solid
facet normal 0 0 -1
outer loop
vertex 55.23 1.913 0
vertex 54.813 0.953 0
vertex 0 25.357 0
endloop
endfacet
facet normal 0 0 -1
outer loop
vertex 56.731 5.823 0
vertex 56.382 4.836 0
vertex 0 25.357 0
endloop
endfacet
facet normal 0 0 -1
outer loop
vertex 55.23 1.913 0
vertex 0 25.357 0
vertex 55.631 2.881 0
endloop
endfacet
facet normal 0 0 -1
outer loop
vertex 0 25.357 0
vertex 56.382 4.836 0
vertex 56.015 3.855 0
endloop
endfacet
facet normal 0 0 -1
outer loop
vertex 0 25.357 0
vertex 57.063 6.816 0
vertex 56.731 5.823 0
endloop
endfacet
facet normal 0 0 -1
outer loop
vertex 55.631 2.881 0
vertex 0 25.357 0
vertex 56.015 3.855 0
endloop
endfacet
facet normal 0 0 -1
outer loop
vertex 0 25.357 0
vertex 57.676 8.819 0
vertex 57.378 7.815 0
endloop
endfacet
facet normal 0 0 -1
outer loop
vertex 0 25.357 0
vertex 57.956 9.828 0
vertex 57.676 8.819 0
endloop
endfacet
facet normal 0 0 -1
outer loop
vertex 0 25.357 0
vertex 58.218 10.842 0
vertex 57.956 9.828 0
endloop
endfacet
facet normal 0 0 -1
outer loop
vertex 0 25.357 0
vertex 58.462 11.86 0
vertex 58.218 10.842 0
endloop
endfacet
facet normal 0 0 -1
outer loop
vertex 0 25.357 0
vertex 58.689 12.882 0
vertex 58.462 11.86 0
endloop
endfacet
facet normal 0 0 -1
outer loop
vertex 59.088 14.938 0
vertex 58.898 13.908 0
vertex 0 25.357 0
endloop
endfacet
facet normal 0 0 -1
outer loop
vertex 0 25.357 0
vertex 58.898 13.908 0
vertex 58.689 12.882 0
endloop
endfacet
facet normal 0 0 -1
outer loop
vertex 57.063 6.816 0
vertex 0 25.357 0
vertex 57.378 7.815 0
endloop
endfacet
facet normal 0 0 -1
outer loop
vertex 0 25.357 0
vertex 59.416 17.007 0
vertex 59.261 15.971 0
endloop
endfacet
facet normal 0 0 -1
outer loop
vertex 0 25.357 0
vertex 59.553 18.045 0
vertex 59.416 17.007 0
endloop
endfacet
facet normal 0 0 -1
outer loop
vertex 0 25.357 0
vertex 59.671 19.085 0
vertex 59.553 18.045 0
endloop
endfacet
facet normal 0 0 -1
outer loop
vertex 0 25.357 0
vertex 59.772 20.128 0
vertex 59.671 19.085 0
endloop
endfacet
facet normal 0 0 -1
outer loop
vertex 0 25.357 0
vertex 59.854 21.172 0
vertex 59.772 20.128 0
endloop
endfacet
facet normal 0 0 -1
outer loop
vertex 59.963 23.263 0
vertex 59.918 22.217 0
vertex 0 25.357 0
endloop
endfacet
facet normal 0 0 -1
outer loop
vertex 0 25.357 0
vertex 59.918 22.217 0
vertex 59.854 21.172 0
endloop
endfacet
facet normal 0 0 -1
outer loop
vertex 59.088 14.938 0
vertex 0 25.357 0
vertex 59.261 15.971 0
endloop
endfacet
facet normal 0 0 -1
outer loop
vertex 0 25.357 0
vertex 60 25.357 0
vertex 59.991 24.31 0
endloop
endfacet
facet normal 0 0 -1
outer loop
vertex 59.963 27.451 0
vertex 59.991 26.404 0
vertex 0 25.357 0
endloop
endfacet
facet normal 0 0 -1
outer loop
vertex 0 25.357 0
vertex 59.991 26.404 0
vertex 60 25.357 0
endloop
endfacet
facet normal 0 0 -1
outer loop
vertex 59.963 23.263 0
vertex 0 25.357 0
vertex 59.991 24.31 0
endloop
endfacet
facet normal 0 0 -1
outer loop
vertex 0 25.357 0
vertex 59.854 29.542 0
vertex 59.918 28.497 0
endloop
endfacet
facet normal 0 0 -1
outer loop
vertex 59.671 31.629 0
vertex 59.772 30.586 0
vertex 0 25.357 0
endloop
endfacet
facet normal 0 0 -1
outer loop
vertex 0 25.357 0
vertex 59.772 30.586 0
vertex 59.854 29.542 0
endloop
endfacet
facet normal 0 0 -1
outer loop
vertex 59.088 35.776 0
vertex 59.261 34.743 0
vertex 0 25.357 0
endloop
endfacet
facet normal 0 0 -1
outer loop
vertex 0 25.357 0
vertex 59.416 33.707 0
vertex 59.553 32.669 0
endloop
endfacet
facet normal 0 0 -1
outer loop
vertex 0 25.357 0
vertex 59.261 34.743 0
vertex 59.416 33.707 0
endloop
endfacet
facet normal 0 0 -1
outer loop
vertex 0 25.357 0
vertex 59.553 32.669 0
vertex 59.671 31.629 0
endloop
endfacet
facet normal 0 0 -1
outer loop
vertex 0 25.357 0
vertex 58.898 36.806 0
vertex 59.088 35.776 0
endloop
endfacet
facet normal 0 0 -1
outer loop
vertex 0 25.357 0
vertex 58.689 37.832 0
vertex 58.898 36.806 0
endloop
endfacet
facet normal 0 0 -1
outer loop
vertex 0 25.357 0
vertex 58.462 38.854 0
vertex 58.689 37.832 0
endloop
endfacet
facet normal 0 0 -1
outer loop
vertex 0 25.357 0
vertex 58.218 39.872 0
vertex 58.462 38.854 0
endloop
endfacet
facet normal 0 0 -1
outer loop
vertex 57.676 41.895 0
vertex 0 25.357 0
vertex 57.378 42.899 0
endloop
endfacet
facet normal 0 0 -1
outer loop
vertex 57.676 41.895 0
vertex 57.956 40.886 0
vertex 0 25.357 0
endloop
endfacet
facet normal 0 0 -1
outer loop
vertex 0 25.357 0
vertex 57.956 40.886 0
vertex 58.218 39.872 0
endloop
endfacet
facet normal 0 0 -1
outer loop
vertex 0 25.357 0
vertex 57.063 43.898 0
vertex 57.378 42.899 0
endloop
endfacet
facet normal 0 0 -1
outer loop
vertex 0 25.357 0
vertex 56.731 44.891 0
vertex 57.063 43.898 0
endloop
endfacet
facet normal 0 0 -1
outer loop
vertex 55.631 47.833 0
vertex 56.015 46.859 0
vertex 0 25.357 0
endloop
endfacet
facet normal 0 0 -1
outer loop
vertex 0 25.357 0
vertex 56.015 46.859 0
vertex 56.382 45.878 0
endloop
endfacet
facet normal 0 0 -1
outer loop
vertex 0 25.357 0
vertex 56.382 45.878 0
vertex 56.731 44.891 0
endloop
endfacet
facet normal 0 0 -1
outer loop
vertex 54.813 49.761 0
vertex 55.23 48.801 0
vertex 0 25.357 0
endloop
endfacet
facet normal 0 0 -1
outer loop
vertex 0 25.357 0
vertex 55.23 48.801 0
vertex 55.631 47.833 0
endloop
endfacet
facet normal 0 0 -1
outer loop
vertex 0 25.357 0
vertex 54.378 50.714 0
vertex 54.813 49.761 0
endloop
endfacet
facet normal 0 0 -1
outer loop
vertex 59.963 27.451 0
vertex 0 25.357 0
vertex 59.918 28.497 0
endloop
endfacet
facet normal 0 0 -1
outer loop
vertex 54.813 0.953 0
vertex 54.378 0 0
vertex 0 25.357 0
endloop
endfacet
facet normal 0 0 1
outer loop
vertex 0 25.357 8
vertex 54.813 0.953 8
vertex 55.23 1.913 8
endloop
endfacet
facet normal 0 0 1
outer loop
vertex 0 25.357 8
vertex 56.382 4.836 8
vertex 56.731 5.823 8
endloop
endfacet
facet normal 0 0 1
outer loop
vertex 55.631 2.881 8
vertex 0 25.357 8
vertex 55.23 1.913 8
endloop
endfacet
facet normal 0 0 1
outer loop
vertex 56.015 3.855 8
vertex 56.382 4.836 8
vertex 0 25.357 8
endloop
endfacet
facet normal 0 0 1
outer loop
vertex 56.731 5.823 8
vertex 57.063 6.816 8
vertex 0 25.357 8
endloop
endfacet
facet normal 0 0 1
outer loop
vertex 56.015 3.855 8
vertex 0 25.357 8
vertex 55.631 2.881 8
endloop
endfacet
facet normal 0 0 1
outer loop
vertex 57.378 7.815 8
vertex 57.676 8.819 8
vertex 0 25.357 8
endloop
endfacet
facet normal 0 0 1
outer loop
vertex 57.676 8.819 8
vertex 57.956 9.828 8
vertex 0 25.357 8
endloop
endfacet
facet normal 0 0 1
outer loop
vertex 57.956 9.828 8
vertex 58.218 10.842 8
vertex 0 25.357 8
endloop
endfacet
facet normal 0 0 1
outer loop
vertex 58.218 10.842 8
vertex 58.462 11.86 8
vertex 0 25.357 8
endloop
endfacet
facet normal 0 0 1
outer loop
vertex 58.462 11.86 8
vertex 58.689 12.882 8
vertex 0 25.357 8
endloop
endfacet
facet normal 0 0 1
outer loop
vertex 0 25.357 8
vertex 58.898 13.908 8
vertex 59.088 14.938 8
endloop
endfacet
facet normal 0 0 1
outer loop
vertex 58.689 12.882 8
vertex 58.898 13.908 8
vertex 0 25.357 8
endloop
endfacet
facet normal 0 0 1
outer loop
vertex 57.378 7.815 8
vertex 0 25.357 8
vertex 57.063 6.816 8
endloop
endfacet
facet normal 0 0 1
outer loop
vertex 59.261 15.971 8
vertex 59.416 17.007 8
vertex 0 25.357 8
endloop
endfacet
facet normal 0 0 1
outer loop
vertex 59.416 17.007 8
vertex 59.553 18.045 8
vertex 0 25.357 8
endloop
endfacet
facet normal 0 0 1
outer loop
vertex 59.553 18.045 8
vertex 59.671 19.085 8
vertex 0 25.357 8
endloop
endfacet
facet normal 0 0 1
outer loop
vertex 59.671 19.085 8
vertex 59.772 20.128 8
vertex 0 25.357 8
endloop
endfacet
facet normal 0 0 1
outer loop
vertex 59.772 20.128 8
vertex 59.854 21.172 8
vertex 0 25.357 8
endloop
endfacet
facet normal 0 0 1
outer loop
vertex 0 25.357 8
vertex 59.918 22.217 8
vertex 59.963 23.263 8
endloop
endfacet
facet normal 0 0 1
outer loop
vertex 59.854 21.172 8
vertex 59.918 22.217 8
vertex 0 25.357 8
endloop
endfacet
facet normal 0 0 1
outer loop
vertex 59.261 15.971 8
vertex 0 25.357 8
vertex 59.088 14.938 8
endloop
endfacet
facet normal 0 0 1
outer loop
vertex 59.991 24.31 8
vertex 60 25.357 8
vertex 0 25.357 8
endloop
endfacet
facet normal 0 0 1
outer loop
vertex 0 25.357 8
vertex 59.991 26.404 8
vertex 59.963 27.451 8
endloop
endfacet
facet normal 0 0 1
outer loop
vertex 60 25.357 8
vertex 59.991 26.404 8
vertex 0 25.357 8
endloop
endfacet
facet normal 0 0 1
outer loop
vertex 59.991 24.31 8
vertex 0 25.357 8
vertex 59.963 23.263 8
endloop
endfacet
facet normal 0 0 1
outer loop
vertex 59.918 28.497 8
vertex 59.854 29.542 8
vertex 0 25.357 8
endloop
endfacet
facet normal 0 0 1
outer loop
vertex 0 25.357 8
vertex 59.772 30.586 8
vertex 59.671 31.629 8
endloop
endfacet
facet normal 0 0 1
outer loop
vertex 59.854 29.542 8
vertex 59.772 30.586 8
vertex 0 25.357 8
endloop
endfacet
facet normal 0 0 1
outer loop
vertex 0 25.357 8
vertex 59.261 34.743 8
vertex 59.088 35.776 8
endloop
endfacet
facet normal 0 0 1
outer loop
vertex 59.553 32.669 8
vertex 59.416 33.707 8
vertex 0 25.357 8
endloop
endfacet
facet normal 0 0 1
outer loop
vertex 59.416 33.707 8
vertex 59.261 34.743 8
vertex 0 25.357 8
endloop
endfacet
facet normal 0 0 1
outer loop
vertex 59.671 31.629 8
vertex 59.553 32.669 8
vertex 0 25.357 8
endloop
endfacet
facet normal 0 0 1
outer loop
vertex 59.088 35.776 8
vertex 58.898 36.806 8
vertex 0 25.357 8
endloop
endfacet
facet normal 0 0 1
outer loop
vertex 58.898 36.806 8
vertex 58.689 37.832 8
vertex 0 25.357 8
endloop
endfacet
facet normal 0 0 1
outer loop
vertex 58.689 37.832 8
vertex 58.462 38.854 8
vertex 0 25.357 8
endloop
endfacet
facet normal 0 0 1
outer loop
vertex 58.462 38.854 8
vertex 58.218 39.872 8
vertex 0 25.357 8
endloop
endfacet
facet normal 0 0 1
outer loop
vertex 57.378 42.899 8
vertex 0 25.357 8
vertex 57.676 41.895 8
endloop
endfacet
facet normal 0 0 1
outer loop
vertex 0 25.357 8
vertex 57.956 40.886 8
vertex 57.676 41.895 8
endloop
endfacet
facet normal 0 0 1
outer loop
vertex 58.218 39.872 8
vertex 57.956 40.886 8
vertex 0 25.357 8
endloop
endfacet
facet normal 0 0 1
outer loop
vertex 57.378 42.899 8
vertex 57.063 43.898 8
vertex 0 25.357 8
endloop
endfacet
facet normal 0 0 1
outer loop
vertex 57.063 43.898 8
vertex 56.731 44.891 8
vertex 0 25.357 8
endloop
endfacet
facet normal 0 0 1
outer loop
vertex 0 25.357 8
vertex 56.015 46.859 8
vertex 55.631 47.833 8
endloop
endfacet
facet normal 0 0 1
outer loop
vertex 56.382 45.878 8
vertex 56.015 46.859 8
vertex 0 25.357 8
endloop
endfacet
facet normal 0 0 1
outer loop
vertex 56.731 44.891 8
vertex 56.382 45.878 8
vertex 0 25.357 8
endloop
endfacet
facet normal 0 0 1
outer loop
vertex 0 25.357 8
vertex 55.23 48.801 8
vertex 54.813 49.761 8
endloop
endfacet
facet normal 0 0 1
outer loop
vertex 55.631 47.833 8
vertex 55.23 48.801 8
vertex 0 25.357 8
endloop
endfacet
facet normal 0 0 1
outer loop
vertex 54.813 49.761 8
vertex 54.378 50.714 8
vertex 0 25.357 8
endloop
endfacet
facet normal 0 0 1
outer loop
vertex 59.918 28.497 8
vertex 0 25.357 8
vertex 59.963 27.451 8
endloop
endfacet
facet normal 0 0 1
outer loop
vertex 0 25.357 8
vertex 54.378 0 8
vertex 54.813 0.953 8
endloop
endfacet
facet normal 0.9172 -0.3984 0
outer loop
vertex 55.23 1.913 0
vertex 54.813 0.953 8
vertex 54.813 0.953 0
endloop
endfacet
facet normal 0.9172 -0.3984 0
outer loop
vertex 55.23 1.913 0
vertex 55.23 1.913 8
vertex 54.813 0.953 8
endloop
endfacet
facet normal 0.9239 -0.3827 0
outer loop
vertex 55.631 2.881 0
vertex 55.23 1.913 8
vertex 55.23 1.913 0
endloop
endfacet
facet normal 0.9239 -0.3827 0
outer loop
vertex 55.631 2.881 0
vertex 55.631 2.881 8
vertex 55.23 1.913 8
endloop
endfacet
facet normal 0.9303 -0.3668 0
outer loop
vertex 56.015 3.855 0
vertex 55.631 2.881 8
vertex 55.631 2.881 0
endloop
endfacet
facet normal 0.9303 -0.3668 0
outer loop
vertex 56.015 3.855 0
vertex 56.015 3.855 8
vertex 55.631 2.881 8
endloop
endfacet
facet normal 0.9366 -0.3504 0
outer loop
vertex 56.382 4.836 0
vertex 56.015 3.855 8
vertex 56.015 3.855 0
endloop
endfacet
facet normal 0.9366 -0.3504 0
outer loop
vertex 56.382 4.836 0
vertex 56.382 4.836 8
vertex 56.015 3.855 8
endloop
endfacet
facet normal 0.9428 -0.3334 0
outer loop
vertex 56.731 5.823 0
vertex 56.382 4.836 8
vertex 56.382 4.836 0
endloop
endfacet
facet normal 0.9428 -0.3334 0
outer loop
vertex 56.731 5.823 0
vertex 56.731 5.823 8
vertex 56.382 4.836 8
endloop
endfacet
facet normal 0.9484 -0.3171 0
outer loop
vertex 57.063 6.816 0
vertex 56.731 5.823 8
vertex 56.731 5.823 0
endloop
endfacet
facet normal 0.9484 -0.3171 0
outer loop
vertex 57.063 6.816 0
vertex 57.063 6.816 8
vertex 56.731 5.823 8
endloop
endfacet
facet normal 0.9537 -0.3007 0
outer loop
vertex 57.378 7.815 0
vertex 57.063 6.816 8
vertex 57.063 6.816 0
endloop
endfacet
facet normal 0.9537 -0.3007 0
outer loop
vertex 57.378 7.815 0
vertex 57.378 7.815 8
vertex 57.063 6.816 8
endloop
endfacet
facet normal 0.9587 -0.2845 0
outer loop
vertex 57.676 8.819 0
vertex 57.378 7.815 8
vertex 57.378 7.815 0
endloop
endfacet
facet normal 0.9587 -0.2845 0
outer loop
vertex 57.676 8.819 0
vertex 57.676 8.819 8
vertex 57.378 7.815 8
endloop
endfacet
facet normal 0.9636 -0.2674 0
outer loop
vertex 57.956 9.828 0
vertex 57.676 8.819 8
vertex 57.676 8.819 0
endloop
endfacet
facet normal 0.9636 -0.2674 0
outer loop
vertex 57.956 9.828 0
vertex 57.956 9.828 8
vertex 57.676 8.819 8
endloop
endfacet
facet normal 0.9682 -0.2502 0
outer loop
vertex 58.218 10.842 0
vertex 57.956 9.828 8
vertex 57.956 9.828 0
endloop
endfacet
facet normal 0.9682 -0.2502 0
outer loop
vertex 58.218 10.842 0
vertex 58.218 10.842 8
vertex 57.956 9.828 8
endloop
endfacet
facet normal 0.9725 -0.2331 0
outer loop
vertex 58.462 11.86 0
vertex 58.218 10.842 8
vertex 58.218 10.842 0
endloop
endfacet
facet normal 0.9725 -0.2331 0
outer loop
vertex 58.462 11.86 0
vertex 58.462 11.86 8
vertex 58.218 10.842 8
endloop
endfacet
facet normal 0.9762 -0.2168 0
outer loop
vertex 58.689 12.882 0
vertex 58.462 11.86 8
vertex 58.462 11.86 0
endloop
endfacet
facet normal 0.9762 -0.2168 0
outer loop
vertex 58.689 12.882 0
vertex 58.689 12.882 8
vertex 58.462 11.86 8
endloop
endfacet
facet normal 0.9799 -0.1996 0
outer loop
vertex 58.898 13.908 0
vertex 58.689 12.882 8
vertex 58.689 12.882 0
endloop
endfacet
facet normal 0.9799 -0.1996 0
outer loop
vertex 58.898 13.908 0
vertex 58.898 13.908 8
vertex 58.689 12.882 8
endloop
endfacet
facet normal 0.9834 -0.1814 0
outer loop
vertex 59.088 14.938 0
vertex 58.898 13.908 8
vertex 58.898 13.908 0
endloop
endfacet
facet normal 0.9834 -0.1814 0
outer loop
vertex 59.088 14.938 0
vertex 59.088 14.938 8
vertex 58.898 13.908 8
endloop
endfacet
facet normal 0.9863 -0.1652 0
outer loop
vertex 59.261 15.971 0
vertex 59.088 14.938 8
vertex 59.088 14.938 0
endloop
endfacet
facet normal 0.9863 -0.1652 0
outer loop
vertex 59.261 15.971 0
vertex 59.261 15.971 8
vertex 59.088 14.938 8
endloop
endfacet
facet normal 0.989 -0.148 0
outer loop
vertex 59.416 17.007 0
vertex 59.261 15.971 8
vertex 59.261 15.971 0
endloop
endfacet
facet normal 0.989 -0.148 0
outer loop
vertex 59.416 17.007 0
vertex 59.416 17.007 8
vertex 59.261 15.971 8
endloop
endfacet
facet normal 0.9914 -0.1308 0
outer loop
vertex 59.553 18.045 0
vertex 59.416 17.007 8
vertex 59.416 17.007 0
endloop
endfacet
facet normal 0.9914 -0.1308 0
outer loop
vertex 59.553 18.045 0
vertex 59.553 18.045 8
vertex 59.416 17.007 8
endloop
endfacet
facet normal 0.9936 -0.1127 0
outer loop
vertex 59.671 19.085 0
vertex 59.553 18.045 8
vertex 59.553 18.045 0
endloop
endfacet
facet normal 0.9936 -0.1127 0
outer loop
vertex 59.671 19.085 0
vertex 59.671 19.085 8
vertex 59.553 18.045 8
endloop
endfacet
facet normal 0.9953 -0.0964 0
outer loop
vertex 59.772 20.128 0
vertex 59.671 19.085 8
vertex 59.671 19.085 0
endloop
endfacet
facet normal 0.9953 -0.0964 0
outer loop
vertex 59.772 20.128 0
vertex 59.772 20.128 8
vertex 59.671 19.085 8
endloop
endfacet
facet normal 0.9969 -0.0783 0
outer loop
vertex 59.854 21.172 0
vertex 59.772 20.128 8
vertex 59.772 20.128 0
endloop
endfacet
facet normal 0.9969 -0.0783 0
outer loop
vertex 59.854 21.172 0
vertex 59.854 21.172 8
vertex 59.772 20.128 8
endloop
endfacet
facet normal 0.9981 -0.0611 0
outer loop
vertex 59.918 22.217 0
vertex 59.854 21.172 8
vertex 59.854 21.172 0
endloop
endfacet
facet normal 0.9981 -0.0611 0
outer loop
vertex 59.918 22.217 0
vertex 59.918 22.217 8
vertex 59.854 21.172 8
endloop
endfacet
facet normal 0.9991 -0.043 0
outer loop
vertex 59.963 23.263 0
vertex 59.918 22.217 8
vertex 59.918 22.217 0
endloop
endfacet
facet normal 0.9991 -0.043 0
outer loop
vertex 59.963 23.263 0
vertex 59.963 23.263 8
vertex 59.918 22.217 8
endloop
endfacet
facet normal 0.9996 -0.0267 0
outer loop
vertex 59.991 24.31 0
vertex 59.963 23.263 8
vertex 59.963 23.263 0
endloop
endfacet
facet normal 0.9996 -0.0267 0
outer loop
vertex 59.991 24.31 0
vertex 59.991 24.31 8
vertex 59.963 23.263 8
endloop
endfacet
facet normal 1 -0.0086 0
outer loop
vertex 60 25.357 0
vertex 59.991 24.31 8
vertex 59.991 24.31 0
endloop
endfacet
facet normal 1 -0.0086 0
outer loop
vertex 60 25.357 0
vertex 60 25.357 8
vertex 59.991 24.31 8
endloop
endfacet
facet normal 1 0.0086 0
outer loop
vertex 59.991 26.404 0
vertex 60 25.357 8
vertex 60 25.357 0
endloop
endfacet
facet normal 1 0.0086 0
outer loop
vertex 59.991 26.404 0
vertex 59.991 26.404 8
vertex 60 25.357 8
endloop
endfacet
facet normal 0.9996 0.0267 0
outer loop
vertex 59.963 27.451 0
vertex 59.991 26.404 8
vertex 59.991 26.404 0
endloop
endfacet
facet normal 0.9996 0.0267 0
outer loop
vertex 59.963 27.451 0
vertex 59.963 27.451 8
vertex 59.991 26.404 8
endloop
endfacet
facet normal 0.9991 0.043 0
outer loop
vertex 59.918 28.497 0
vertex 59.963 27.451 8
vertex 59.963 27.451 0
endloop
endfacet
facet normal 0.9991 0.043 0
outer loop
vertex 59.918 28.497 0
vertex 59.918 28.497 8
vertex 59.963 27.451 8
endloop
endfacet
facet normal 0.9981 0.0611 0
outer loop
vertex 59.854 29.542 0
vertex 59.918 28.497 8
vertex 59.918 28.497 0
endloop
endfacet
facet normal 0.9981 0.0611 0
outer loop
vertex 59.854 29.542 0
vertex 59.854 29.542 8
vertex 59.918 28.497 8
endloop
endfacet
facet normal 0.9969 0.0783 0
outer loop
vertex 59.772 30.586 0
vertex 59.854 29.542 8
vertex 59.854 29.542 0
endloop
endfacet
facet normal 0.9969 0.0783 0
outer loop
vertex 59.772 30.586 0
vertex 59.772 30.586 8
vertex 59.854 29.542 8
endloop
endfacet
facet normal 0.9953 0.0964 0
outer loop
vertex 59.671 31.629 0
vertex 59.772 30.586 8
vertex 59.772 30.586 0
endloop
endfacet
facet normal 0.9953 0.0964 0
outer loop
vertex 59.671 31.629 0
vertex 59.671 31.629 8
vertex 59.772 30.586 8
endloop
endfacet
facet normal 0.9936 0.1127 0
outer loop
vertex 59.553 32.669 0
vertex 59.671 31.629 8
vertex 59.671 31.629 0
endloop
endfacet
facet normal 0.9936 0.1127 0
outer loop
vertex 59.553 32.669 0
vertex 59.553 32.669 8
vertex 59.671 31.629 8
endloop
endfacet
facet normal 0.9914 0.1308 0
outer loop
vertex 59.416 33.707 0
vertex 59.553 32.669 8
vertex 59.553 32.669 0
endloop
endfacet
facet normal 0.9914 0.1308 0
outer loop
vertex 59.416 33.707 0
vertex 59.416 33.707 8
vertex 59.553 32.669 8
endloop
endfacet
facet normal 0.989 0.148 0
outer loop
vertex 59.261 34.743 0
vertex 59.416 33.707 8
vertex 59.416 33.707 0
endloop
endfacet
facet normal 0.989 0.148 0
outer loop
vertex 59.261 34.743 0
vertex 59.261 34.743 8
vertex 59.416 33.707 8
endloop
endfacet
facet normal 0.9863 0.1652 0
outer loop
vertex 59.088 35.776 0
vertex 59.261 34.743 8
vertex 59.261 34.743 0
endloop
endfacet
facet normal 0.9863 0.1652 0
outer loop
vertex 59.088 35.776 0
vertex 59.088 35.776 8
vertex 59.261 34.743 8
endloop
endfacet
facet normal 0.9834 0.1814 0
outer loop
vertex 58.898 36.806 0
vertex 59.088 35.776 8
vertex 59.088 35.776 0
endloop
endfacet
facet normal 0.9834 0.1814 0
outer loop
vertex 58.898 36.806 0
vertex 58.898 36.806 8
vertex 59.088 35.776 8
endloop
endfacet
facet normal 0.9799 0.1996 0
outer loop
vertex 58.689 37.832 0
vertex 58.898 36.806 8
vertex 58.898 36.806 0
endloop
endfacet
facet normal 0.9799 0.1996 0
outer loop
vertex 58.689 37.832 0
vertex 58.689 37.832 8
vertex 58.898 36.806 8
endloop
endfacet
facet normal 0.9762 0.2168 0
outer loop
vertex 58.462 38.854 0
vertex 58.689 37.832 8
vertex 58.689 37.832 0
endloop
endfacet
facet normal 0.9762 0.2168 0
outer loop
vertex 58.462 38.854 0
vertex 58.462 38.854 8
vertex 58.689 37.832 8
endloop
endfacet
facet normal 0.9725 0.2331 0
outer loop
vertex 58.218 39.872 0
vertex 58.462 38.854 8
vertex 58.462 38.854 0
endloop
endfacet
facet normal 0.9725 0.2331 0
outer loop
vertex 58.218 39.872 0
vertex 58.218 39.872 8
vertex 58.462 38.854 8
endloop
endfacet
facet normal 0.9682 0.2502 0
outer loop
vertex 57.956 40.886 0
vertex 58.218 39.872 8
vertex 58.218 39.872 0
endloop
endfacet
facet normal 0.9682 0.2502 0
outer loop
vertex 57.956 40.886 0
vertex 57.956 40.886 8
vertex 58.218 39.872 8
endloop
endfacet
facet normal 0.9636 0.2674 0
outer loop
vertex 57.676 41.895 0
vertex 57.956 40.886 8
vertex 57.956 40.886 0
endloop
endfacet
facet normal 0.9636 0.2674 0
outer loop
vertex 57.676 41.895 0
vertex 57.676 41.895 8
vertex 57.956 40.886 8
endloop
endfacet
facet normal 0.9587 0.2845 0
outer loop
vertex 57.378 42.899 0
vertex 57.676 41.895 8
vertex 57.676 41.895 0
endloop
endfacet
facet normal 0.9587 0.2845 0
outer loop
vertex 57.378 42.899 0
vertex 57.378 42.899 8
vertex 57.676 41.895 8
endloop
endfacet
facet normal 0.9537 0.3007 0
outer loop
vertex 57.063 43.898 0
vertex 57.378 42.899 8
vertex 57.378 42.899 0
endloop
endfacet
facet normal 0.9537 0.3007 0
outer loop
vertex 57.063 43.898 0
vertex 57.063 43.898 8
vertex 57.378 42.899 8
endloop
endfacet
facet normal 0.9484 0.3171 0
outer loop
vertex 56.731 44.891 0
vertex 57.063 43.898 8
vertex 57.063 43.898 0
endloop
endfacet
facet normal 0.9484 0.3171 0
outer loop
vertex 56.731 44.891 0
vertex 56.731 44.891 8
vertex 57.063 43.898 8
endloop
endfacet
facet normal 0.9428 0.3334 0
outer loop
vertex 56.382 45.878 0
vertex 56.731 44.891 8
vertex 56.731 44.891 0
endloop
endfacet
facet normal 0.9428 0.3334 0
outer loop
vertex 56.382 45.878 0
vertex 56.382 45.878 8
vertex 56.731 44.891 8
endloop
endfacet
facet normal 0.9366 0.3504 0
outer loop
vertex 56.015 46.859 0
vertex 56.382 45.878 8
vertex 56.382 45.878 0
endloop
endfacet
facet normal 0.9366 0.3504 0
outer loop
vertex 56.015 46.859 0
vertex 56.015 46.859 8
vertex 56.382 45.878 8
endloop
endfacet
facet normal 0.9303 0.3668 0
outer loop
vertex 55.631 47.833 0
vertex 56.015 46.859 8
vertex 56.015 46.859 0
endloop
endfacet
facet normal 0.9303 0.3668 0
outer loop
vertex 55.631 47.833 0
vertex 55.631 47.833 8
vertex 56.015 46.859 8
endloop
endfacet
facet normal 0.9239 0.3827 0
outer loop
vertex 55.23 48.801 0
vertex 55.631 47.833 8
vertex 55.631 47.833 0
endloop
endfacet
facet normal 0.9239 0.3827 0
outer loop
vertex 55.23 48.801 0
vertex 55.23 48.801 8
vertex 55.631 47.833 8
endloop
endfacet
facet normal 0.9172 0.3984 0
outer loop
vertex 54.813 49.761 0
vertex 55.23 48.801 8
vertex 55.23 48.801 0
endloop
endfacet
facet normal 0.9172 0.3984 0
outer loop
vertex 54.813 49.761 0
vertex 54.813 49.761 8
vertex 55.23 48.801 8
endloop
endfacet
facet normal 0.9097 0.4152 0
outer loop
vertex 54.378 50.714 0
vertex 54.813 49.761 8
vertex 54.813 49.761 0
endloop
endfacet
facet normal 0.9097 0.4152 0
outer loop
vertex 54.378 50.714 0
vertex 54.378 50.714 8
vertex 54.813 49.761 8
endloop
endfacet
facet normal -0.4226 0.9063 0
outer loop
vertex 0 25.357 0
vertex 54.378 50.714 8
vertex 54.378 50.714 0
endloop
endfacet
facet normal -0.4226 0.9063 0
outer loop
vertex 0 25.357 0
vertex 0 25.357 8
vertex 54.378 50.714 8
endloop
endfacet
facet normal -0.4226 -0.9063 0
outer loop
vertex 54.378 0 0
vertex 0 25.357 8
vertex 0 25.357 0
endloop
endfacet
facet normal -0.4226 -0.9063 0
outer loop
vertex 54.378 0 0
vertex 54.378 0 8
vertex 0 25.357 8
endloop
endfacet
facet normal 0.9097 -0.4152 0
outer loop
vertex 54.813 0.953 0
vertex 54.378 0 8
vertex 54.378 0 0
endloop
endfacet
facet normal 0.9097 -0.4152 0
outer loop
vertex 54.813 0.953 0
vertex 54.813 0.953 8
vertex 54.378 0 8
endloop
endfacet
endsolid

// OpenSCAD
$fn = 32;

// ----------------------------------------------------------------------
// Arc profile plate: sector, 52 points
// ----------------------------------------------------------------------

// --- parameters (mm) ---
sector_angle = 50;        // sector angle, degrees
sector_r = 60;            // outer radius
arc_step = 1;             // sampling step of the arc, degrees
plate_t = 8;              // plate thickness, Z

bbox_x = 2 * sector_r * sin(sector_angle / 2);  // chord of the sector
bbox_y = sector_r;  // depth of the sector (apex to arc)

profile = [[54.378, 0], [54.813, 0.953], [55.23, 1.913], [55.631, 2.881], [56.015, 3.855], [56.382, 4.836], [56.731, 5.823], [57.063, 6.816], [57.378, 7.815], [57.676, 8.819], [57.956, 9.828], [58.218, 10.842], [58.462, 11.86], [58.689, 12.882], [58.898, 13.908], [59.088, 14.938], [59.261, 15.971], [59.416, 17.007], [59.553, 18.045], [59.671, 19.085], [59.772, 20.128], [59.854, 21.172], [59.918, 22.217], [59.963, 23.263], [59.991, 24.31], [60, 25.357], [59.991, 26.404], [59.963, 27.451], [59.918, 28.497], [59.854, 29.542], [59.772, 30.586], [59.671, 31.629], [59.553, 32.669], [59.416, 33.707], [59.261, 34.743], [59.088, 35.776], [58.898, 36.806], [58.689, 37.832], [58.462, 38.854], [58.218, 39.872], [57.956, 40.886], [57.676, 41.895], [57.378, 42.899], [57.063, 43.898], [56.731, 44.891], [56.382, 45.878], [56.015, 46.859], [55.631, 47.833], [55.23, 48.801], [54.813, 49.761], [54.378, 50.714], [0, 25.357]];  // primary outline, 52 points, counter clockwise

// --- the one profile operation ---
linear_extrude(height = plate_t) polygon(points = profile);
